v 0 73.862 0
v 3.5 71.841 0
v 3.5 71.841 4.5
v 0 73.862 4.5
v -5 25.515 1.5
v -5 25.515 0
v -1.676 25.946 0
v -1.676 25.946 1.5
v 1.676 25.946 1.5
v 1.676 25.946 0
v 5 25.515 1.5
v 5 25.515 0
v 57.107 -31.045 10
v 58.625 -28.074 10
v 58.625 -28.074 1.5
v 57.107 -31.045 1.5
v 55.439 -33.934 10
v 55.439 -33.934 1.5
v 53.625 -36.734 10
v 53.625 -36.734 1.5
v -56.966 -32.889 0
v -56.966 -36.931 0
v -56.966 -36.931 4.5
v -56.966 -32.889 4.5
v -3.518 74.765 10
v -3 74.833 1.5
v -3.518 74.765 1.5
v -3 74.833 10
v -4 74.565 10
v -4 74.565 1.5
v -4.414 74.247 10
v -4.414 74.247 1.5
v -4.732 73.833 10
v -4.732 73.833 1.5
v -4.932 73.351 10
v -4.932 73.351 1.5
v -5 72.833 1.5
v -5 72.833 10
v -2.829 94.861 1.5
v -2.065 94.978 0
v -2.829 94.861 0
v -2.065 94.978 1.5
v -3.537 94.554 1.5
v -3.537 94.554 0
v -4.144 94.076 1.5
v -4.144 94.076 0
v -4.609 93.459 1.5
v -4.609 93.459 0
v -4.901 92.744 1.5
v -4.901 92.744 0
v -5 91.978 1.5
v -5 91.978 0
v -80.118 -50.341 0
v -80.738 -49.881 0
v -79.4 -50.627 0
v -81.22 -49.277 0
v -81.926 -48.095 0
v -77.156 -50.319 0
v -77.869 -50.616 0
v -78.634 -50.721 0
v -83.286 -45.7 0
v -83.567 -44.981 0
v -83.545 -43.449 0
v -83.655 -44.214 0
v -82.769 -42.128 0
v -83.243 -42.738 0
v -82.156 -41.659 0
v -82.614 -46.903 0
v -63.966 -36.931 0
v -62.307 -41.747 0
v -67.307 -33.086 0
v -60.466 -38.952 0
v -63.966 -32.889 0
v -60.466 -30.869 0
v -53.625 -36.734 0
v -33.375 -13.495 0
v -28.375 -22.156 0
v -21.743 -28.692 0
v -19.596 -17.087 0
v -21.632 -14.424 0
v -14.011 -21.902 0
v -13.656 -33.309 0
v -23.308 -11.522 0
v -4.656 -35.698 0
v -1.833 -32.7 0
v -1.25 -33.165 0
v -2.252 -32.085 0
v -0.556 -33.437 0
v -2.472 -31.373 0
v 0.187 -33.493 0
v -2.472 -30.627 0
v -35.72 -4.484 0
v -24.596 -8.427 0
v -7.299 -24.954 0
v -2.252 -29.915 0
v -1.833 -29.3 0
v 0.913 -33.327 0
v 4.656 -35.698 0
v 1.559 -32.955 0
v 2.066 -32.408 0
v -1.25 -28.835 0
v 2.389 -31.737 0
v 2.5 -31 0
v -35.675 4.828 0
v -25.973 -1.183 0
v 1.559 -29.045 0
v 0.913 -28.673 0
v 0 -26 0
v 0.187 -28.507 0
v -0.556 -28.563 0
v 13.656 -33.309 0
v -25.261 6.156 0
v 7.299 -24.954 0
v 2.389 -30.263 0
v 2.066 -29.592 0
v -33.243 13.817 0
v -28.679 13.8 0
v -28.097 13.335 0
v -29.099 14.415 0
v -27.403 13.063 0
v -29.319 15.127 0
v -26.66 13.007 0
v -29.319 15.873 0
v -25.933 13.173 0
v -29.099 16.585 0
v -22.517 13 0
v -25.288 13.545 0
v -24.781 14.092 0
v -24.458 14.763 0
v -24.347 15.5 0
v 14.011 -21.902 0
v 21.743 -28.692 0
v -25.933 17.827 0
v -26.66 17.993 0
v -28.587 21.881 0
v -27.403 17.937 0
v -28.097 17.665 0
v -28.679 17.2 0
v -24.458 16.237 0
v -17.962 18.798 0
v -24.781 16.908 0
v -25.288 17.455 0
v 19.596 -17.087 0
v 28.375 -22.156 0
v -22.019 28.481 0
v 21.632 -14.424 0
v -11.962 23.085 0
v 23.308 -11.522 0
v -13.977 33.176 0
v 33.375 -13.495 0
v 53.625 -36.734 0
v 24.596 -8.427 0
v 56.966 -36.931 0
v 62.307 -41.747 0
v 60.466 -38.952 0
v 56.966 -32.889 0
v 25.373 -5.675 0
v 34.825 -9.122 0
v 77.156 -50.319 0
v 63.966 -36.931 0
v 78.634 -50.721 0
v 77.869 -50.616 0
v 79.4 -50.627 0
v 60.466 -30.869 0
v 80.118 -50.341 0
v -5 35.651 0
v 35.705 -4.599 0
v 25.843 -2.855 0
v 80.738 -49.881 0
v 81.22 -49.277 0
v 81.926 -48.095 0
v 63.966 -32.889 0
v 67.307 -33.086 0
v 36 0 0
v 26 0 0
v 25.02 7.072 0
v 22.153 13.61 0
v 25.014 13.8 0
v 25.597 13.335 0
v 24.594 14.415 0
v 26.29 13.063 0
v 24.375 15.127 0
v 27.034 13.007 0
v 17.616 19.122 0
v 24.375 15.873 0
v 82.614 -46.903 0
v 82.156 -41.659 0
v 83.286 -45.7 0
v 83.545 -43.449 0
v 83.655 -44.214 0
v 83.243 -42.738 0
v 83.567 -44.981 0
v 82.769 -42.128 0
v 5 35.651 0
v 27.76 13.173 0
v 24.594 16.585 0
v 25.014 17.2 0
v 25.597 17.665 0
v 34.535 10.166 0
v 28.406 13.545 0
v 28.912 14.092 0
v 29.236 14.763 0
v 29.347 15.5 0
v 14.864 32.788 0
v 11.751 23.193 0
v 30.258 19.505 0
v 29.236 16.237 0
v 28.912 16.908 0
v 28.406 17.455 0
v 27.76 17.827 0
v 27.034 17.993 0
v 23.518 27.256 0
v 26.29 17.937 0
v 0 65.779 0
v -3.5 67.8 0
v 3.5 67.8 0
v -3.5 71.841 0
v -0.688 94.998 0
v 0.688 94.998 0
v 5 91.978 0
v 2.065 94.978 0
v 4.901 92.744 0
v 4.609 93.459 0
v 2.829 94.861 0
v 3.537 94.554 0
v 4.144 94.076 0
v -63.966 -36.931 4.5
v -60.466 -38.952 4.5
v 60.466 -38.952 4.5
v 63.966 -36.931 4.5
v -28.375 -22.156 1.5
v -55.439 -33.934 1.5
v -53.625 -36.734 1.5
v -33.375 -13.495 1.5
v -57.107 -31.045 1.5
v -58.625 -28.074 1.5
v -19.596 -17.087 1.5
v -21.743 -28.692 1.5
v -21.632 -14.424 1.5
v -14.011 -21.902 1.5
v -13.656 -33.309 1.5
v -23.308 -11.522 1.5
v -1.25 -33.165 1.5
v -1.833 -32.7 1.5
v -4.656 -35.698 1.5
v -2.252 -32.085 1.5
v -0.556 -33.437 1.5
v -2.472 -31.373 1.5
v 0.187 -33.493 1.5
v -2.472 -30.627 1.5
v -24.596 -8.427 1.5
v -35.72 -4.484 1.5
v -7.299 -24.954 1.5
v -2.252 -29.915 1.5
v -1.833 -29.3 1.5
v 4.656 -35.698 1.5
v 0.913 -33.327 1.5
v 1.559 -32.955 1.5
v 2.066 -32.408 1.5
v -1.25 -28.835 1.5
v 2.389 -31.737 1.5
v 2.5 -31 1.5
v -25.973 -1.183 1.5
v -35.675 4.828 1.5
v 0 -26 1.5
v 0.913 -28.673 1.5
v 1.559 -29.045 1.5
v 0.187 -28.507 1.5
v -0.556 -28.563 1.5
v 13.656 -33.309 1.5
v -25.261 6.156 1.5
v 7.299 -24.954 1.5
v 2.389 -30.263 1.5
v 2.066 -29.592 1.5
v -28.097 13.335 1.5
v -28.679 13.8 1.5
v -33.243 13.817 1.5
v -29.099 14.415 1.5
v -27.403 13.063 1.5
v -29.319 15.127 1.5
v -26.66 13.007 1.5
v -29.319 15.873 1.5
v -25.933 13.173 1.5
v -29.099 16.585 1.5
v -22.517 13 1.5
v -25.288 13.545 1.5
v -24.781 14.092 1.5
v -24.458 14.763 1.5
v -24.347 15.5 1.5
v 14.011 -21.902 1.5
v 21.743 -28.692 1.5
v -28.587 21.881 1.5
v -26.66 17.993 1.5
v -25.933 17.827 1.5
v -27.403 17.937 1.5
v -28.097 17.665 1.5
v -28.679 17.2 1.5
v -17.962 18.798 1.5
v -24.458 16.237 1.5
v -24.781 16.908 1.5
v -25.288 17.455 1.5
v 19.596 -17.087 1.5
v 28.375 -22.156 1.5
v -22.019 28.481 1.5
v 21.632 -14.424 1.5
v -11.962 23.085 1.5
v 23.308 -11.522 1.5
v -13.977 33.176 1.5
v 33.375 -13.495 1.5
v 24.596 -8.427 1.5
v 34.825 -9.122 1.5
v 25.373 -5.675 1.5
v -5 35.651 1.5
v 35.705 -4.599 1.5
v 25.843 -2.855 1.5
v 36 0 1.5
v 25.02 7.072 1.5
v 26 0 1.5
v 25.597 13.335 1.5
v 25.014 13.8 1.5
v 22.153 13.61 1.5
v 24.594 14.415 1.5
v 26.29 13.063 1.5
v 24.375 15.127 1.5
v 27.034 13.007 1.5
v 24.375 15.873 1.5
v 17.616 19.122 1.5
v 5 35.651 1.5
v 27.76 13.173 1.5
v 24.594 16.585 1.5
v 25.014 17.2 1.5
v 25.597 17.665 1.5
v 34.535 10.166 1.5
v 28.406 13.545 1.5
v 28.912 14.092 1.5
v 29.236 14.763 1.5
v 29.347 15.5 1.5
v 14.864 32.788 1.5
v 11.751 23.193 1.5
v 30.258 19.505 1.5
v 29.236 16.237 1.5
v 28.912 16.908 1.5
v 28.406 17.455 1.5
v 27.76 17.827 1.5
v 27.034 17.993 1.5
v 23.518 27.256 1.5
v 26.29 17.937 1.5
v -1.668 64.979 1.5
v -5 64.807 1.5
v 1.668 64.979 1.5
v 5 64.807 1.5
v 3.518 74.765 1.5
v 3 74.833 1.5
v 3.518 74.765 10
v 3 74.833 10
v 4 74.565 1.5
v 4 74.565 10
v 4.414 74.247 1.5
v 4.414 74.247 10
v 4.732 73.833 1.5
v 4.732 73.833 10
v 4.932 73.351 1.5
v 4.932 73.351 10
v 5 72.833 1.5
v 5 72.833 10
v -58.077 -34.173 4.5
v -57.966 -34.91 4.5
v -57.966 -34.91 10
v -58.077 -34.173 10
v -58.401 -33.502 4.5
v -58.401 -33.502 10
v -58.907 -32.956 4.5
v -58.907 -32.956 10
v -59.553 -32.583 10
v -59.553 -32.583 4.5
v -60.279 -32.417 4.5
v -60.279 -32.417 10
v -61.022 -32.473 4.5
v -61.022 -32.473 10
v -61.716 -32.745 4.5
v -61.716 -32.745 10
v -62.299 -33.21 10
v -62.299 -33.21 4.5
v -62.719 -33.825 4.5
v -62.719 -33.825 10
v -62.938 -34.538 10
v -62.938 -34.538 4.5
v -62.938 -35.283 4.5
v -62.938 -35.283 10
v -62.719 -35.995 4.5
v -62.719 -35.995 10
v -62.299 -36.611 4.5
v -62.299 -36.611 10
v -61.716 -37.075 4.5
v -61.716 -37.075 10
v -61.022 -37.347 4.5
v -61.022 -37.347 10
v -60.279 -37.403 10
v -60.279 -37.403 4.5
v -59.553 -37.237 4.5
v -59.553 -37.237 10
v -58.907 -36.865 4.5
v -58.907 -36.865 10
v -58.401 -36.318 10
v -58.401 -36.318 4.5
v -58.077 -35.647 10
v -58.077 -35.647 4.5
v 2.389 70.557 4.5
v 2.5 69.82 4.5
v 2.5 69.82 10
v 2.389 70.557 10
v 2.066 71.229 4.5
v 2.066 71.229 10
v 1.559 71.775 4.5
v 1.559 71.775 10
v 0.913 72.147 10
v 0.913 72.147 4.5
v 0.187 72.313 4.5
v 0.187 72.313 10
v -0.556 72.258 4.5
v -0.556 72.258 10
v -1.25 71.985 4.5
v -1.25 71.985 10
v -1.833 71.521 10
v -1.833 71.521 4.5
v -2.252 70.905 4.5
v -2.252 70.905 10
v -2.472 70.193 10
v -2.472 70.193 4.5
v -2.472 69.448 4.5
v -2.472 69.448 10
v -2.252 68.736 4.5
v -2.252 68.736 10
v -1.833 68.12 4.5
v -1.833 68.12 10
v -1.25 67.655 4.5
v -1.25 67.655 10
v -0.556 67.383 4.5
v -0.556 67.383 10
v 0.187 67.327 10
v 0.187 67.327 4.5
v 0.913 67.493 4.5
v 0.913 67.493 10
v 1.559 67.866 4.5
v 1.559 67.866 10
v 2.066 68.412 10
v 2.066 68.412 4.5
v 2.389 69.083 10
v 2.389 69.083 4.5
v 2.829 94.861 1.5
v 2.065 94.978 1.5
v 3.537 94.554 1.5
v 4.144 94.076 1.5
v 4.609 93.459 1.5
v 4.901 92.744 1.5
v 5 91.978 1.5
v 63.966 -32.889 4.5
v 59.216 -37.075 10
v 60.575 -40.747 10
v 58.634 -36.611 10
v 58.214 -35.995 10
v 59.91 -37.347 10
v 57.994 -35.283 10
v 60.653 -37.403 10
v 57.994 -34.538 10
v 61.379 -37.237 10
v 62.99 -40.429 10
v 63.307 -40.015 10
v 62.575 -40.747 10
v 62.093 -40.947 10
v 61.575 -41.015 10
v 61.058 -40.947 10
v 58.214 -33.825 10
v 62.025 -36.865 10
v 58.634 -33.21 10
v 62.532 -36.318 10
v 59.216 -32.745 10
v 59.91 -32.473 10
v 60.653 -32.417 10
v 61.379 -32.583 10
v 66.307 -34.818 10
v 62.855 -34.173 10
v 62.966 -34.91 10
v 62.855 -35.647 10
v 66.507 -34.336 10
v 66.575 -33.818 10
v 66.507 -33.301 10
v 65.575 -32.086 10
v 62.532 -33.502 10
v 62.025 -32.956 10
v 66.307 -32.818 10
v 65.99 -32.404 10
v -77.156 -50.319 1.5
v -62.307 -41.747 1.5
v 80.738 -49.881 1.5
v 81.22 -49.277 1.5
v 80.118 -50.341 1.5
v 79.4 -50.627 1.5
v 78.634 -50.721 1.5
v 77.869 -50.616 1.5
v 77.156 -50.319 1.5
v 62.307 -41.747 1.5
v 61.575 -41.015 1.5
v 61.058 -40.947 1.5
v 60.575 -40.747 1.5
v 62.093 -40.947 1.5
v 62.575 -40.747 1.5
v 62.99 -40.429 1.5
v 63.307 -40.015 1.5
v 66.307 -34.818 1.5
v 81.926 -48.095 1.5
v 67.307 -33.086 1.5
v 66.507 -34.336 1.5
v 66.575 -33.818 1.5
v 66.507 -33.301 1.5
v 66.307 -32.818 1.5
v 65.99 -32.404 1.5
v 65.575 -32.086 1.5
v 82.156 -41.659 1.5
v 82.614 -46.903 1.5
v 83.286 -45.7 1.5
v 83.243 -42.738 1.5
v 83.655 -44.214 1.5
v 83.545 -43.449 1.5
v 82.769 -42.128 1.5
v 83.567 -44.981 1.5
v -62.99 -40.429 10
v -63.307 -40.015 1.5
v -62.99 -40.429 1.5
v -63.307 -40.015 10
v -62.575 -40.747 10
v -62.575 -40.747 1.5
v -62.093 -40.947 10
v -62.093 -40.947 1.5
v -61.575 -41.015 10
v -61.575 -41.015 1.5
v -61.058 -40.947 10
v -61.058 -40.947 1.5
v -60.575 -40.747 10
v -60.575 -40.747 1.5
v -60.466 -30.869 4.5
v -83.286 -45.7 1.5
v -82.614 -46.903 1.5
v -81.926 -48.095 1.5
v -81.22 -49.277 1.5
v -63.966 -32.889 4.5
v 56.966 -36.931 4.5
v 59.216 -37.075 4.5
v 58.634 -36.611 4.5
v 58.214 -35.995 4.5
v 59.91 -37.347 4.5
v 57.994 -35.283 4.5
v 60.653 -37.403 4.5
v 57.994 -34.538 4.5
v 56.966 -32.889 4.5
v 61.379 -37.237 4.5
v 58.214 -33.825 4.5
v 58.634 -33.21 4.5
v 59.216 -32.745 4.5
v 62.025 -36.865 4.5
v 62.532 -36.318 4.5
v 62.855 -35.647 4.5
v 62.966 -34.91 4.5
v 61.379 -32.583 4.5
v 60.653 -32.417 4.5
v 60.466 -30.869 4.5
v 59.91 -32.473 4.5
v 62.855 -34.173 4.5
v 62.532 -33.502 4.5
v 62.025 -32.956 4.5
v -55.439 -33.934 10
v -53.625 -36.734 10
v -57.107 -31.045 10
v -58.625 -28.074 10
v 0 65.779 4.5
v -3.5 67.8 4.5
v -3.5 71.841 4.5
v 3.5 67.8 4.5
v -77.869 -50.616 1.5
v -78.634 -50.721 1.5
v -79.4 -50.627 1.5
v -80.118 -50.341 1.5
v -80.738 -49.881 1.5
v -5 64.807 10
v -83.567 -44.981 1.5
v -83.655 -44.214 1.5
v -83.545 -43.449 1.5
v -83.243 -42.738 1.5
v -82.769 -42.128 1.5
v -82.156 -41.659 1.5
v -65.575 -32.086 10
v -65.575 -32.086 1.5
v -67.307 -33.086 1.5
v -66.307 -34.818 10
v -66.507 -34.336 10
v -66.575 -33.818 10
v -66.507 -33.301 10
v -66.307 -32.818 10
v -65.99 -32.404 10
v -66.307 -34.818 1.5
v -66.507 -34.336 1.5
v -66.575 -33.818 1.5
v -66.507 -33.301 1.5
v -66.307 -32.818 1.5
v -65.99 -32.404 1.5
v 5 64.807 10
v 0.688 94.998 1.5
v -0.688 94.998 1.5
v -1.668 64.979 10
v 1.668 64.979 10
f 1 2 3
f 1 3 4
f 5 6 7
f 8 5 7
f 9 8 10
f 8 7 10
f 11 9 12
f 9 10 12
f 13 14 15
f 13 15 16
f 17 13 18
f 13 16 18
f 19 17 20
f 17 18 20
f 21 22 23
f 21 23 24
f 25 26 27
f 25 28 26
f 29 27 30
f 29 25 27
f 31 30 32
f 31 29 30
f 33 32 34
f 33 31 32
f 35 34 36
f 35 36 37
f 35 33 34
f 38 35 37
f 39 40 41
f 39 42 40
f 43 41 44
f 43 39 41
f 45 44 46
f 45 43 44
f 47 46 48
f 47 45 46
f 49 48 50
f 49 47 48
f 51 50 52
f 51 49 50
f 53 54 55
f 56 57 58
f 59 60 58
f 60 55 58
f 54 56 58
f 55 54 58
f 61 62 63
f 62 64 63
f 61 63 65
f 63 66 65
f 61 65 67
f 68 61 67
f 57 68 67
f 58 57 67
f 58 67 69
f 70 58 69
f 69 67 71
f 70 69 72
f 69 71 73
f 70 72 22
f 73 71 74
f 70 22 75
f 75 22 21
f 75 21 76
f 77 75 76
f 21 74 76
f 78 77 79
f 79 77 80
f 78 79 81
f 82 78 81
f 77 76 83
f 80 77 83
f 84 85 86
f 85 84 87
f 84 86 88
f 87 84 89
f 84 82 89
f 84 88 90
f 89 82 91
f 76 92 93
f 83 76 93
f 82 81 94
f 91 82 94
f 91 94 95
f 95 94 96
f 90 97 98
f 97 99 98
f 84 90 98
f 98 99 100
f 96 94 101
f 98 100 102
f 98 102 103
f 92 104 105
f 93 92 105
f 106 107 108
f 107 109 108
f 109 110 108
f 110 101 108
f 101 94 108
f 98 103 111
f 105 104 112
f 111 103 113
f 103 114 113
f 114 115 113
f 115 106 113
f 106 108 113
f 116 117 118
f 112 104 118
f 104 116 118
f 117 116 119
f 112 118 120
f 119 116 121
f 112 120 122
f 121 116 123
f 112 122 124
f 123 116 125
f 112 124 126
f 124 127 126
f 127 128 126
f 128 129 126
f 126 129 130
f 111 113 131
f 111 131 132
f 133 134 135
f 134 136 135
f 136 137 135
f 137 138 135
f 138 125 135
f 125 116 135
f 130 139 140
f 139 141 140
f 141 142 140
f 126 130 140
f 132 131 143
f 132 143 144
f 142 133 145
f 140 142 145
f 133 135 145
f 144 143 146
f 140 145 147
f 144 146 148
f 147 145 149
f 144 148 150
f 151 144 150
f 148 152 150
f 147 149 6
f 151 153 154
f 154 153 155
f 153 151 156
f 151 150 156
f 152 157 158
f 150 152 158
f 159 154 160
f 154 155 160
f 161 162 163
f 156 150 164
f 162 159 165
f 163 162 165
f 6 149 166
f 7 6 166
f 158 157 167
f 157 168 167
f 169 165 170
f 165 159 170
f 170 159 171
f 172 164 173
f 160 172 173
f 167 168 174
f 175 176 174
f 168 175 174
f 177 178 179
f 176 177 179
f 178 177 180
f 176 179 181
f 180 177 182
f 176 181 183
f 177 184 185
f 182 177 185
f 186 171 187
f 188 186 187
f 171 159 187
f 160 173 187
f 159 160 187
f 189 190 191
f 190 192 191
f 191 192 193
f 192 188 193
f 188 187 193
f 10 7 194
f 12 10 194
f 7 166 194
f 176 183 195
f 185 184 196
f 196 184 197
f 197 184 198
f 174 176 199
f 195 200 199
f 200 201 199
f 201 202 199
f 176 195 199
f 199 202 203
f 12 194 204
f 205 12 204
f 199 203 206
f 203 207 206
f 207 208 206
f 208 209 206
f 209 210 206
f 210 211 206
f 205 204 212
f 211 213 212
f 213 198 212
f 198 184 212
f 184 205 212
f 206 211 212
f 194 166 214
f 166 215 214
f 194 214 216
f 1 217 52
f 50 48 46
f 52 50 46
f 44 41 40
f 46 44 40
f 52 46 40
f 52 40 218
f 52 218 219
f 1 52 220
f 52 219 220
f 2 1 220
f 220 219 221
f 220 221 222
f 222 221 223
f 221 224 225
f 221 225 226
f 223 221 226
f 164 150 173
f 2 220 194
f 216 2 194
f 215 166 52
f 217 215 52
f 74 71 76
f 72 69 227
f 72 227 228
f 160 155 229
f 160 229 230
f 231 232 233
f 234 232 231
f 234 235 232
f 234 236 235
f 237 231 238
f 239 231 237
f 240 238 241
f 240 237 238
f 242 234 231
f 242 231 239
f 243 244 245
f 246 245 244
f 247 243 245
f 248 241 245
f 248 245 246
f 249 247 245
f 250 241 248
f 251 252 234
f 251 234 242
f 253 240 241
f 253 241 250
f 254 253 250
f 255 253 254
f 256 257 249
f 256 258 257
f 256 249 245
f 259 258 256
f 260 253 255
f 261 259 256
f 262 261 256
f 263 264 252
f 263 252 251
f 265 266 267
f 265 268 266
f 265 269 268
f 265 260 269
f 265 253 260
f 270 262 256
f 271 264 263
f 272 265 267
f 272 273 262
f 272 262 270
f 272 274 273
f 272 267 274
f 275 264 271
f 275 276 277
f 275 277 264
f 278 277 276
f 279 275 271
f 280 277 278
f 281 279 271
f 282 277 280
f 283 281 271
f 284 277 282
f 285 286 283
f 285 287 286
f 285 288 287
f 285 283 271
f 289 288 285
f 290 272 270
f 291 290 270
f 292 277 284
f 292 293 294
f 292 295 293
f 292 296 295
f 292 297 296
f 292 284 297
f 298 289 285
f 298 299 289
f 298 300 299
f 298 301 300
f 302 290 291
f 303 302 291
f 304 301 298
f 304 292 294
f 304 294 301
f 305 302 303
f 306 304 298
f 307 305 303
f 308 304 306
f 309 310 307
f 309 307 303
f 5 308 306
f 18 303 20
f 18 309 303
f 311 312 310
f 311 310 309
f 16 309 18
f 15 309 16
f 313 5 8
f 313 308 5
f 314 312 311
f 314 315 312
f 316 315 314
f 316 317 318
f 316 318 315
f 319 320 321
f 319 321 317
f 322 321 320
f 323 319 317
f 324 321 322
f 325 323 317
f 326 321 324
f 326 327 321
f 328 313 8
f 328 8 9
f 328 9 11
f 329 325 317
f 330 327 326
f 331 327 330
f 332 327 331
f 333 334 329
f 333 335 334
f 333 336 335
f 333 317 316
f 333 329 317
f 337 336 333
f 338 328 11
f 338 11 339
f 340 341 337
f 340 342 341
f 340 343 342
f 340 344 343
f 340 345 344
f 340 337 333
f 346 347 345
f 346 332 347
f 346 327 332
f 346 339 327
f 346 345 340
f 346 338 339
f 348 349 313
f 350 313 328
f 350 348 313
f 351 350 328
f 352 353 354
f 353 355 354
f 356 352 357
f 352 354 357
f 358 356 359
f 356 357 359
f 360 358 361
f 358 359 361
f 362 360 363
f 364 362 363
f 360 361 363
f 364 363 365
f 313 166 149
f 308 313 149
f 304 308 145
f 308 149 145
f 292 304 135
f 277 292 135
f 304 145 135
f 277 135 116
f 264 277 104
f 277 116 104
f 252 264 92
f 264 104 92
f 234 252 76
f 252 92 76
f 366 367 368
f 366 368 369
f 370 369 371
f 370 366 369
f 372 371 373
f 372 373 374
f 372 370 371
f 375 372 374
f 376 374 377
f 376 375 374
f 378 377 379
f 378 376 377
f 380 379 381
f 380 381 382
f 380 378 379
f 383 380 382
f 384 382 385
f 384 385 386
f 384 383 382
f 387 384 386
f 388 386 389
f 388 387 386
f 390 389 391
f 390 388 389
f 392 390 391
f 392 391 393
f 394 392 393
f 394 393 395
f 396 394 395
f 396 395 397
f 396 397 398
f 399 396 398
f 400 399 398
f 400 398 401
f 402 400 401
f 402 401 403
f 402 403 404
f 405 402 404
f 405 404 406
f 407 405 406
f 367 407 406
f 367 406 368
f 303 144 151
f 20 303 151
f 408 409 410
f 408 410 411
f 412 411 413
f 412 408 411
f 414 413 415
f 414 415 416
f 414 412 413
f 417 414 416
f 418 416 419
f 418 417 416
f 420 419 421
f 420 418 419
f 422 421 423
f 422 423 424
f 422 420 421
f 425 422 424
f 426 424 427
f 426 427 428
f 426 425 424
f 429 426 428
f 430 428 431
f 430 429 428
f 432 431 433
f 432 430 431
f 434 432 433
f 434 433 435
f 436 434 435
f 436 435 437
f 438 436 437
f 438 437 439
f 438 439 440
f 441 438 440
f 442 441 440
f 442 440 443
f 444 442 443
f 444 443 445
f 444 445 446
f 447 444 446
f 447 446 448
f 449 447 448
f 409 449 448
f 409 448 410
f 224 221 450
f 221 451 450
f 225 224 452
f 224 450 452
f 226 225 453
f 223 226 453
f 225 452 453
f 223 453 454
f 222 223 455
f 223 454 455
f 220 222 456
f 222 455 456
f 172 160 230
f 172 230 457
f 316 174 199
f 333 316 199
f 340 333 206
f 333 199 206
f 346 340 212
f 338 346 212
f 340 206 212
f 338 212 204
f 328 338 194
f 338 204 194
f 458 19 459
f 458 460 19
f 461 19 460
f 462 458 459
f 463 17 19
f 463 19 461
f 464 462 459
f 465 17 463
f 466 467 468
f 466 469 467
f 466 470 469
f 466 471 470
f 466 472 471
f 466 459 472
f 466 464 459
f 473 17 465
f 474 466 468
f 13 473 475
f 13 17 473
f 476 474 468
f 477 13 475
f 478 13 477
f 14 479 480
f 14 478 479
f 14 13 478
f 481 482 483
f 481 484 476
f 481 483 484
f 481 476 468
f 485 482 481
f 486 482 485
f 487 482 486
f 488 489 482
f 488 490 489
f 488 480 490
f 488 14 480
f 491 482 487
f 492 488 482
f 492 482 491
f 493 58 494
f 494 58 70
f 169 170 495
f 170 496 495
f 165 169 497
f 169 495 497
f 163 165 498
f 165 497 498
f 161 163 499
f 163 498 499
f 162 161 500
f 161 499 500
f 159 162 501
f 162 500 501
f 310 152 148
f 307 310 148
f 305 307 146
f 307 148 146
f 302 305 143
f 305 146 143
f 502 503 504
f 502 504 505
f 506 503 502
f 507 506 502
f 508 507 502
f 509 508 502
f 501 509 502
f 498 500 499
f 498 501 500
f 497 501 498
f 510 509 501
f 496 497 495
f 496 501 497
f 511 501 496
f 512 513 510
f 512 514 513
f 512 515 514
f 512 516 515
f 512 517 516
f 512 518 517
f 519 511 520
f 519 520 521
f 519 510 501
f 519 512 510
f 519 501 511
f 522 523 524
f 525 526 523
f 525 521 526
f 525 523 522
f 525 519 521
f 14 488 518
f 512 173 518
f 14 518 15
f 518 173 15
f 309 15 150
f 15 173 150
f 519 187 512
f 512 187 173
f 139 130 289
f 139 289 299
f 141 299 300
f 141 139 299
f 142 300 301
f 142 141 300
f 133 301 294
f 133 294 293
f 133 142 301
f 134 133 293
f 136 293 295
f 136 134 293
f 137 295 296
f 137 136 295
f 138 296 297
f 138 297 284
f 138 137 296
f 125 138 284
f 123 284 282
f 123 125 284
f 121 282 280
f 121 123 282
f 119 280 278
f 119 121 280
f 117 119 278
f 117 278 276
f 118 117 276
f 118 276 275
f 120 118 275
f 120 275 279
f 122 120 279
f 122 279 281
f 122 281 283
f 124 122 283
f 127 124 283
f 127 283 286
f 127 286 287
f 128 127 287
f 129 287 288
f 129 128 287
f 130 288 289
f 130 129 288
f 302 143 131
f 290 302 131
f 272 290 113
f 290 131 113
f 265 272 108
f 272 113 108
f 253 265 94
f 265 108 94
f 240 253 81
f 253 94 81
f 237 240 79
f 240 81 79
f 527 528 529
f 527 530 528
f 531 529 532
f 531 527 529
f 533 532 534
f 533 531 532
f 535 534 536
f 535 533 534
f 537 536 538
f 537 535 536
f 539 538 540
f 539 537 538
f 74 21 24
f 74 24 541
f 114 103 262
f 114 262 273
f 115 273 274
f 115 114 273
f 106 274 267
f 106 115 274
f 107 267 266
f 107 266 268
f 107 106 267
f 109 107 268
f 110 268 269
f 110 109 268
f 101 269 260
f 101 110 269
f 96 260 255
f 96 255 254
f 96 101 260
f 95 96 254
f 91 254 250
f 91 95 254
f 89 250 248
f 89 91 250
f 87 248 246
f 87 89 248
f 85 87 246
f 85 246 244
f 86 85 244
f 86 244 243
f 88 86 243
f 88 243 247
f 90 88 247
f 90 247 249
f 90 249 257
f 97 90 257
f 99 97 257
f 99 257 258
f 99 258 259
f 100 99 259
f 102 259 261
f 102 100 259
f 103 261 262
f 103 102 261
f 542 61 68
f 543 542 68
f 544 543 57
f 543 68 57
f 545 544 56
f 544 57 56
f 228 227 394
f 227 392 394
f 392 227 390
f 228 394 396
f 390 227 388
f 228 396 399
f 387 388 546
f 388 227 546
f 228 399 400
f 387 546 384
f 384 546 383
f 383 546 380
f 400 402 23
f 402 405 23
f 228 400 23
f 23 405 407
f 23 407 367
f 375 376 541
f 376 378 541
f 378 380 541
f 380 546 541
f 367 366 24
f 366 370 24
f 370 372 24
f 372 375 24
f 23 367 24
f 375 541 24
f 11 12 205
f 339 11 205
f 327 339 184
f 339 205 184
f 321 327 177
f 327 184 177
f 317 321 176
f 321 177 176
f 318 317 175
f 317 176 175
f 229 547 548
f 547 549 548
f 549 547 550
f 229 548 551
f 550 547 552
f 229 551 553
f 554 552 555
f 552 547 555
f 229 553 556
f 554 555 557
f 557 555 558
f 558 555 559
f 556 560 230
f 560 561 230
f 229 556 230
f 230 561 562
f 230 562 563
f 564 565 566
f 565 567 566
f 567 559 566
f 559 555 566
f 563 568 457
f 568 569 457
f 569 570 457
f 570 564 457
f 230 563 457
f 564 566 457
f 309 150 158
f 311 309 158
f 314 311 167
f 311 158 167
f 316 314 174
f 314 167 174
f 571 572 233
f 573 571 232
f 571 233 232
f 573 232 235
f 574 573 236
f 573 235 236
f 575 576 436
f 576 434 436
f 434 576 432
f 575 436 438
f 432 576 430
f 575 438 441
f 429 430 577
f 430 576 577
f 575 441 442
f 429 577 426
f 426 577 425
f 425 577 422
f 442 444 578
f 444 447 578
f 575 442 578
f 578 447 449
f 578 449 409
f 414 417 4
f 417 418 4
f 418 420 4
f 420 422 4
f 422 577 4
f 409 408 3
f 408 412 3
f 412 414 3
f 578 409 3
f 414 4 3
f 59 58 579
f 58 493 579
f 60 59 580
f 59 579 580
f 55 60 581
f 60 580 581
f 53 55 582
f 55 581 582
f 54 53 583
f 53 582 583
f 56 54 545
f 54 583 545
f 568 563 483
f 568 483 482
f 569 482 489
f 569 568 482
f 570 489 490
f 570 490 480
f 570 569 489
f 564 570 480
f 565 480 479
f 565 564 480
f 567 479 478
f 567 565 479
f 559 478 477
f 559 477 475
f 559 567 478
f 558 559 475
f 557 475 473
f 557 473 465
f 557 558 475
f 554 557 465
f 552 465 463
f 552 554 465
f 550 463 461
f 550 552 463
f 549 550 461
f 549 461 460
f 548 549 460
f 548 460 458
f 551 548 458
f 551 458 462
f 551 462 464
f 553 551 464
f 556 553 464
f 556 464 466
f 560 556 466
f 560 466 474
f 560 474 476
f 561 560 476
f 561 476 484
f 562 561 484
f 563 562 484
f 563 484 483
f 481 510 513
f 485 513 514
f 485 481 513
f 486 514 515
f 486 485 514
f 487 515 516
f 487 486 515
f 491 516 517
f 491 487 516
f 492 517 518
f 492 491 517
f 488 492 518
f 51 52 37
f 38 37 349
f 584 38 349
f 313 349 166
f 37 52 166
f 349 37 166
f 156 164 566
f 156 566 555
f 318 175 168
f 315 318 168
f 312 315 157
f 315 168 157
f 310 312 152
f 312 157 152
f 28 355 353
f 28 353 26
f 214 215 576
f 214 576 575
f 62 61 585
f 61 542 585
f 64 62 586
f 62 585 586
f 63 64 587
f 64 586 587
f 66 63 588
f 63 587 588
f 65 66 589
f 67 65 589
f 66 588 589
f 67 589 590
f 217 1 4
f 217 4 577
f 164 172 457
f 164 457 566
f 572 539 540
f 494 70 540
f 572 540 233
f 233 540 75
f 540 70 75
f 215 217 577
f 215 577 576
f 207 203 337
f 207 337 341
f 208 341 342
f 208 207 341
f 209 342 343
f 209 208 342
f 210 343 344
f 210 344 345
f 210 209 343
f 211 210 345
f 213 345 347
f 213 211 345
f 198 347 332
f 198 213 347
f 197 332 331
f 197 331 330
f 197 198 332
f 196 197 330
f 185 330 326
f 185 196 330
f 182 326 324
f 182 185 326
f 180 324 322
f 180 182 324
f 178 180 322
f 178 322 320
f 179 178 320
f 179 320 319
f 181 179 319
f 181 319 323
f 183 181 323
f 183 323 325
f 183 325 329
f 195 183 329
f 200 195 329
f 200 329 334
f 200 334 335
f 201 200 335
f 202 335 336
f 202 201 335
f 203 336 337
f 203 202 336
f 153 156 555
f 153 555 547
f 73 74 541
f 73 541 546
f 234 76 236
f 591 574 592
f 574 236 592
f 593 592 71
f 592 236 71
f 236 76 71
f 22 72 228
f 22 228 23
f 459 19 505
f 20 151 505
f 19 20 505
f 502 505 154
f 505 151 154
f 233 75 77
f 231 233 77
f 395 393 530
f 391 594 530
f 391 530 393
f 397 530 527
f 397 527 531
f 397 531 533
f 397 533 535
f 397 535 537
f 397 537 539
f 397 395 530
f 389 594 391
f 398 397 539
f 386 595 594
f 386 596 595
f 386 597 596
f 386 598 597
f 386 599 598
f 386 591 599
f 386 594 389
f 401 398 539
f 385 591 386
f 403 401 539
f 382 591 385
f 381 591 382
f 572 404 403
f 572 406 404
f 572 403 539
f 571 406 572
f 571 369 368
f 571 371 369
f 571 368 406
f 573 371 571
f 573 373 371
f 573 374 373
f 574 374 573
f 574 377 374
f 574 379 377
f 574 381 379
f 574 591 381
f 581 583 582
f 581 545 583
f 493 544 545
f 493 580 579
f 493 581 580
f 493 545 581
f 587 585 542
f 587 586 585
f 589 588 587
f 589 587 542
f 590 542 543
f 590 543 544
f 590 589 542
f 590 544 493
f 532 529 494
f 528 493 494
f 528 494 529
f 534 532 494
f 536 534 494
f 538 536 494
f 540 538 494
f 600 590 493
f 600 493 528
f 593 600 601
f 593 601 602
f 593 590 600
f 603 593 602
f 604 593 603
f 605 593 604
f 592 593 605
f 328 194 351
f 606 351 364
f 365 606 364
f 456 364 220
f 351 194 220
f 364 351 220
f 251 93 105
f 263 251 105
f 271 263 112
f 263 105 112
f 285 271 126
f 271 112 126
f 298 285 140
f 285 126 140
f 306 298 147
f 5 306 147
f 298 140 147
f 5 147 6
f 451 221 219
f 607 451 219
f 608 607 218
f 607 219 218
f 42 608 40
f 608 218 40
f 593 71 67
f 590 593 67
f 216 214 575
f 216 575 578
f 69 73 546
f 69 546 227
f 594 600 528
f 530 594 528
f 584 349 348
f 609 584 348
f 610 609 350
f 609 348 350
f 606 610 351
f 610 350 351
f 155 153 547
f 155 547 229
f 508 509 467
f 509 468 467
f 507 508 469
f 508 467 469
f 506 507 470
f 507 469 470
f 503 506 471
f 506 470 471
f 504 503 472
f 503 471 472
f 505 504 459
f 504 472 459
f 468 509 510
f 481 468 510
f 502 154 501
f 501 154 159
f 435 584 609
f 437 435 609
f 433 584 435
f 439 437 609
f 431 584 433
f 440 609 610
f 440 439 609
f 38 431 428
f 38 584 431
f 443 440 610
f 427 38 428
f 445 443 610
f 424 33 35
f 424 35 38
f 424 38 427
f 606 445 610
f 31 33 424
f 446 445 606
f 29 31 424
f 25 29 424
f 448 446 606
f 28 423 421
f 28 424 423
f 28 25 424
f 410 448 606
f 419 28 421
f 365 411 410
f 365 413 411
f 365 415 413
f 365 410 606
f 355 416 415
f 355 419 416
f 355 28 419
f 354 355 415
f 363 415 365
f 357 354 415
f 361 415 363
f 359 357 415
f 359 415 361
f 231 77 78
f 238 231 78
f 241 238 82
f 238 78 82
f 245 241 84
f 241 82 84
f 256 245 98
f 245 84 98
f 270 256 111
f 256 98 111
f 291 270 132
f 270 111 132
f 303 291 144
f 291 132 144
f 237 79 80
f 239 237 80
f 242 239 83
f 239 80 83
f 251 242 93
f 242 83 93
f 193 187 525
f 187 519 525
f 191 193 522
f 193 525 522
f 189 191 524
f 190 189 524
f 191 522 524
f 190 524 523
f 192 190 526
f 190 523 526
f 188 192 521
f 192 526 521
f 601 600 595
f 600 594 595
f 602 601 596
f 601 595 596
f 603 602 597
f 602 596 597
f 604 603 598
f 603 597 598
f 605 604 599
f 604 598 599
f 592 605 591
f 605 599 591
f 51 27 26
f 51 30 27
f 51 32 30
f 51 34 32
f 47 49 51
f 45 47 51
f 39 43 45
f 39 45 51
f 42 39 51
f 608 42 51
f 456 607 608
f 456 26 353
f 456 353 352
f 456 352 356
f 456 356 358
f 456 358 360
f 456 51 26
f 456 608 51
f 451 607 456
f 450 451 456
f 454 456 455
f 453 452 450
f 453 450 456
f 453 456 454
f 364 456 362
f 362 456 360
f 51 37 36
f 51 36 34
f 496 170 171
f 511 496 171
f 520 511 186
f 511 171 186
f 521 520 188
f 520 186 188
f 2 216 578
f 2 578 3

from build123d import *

# Parameters (mm, degrees)
F0_R     = 2.5
F1_DEPTH = 1.5
F2_DEPTH = 10
F3_R     = 2
F4_R     = 3
F5_DEPTH = 4.5


with BuildPart() as f1:
    # F0 (on Top) → F1 (new body)
    with BuildSketch(Plane.XY):
        with BuildLine():
            Line((84.6583836258, -43.1040378836), (67.3074069841, -33.0864468488))
            ThreePointArc((67.3074069841, -33.0864468488), (64.9519052838, -37.5), (62.3074069841, -41.7467008867))
            Line((62.3074069841, -41.7467008867), (79.6583836258, -51.7642919214))
            ThreePointArc((79.6583836258, -51.7642919214), (82.2724133595, -47.5), (84.6583836258, -43.1040378836))
        make_face()
        with BuildLine():
            ThreePointArc((62.3074069841, -41.7467008867), (64.9519052838, -37.5), (67.3074069841, -33.0864468488))
            Line((67.3074069841, -33.0864468488), (62.3074069841, -41.7467008867))
        make_face()
        with BuildLine():
            Line((67.3074069841, -33.0864468488), (58.6248608016, -28.0735764731))
            ThreePointArc((58.6248608016, -28.0735764731), (56.291651246, -32.5), (53.6248608016, -36.733830511))
            Line((53.6248608016, -36.733830511), (62.3074069841, -41.7467008867))
            Line((62.3074069841, -41.7467008867), (67.3074069841, -33.0864468488))
        make_face()
        Polygon((63.9661338928, -36.9308646221), (60.4661338928, -38.9515905642), (56.9661338928, -36.9308646221), (56.9661338928, -32.8894127377), (60.4661338928, -30.8686867956), (63.9661338928, -32.8894127377), align=None, mode=Mode.SUBTRACT)
        with BuildLine():
            Line((58.6248608016, -28.0735764731), (33.3747469625, -13.4954164511))
            ThreePointArc((33.3747469625, -13.4954164511), (31.1769145362, -18), (28.3747469625, -22.1556704889))
            Line((28.3747469625, -22.1556704889), (53.6248608016, -36.733830511))
            ThreePointArc((53.6248608016, -36.733830511), (56.291651246, -32.5), (58.6248608016, -28.0735764731))
        make_face()
        with BuildLine():
            Line((33.3747469625, -13.4954164511), (24.596379794, -8.4272238033))
            ThreePointArc((24.596379794, -8.4272238033), (22.5166604984, -13), (19.596379794, -17.0874778411))
            Line((19.596379794, -17.0874778411), (28.3747469625, -22.1556704889))
            ThreePointArc((28.3747469625, -22.1556704889), (31.1769145362, -18), (33.3747469625, -13.4954164511))
        make_face()
        with BuildLine():
            ThreePointArc((5, 25.5147016443), (20.0748598999, 16.5227116419), (26, 0))
            ThreePointArc((26, 0), (25.6466944716, -4.2716580713), (24.596379794, -8.4272238033))
            Line((24.596379794, -8.4272238033), (33.3747469625, -13.4954164511))
            ThreePointArc((33.3747469625, -13.4954164511), (35.3375925231, -6.8741948383), (36, 0))
            ThreePointArc((36, 0), (27.1661554144, 23.622023622), (5, 35.65108694))
            Line((5, 35.65108694), (5, 25.5147016443))
        make_face()
        with Locations((26.8467875173, 15.5)):
            Circle(F0_R, mode=Mode.SUBTRACT)
        with BuildLine():
            Line((28.3747469625, -22.1556704889), (19.596379794, -17.0874778411))
            ThreePointArc((19.596379794, -17.0874778411), (0, -26), (-19.596379794, -17.0874778411))
            Line((-19.596379794, -17.0874778411), (-28.3747469625, -22.1556704889))
            ThreePointArc((-28.3747469625, -22.1556704889), (0, -36), (28.3747469625, -22.1556704889))
        make_face()
        with Locations((0, -31)):
            Circle(F0_R, mode=Mode.SUBTRACT)
        with BuildLine():
            ThreePointArc((-28.3747469625, -22.1556704889), (-31.1769145362, -18), (-33.3747469625, -13.4954164511))
            Line((-33.3747469625, -13.4954164511), (-58.6248608016, -28.0735764731))
            ThreePointArc((-58.6248608016, -28.0735764731), (-56.291651246, -32.5), (-53.6248608016, -36.733830511))
            Line((-53.6248608016, -36.733830511), (-28.3747469625, -22.1556704889))
        make_face()
        with BuildLine():
            ThreePointArc((-19.596379794, -17.0874778411), (-22.5166604984, -13), (-24.596379794, -8.4272238033))
            Line((-24.596379794, -8.4272238033), (-33.3747469625, -13.4954164511))
            ThreePointArc((-33.3747469625, -13.4954164511), (-31.1769145362, -18), (-28.3747469625, -22.1556704889))
            Line((-28.3747469625, -22.1556704889), (-19.596379794, -17.0874778411))
        make_face()
        with BuildLine():
            ThreePointArc((-53.6248608016, -36.733830511), (-56.291651246, -32.5), (-58.6248608016, -28.0735764731))
            Line((-58.6248608016, -28.0735764731), (-67.3074069841, -33.0864468488))
            Line((-67.3074069841, -33.0864468488), (-62.3074069841, -41.7467008867))
            Line((-62.3074069841, -41.7467008867), (-53.6248608016, -36.733830511))
        make_face()
        Polygon((-63.9661338928, -32.8894127377), (-60.4661338928, -30.8686867956), (-56.9661338928, -32.8894127377), (-56.9661338928, -36.9308646221), (-60.4661338928, -38.9515905642), (-63.9661338928, -36.9308646221), align=None, mode=Mode.SUBTRACT)
        with BuildLine():
            Line((-62.3074069841, -41.7467008867), (-67.3074069841, -33.0864468488))
            ThreePointArc((-67.3074069841, -33.0864468488), (-64.9519052838, -37.5), (-62.3074069841, -41.7467008867))
        make_face()
        with BuildLine():
            ThreePointArc((-62.3074069841, -41.7467008867), (-64.9519052838, -37.5), (-67.3074069841, -33.0864468488))
            Line((-67.3074069841, -33.0864468488), (-84.6583836258, -43.1040378836))
            ThreePointArc((-84.6583836258, -43.1040378836), (-82.2724133595, -47.5), (-79.6583836258, -51.7642919214))
            Line((-79.6583836258, -51.7642919214), (-62.3074069841, -41.7467008867))
        make_face()
        with BuildLine():
            ThreePointArc((-24.596379794, -8.4272238033), (-22.5166604984, 13), (-5, 25.5147016443))
            Line((-5, 25.5147016443), (-5, 35.65108694))
            ThreePointArc((-5, 35.65108694), (-31.1769145362, 18), (-33.3747469625, -13.4954164511))
            Line((-33.3747469625, -13.4954164511), (-24.596379794, -8.4272238033))
        make_face()
        with Locations((-26.8467875173, 15.5)):
            Circle(F0_R, mode=Mode.SUBTRACT)
        with BuildLine():
            ThreePointArc((-5, 25.5147016443), (0, 26), (5, 25.5147016443))
            Line((5, 25.5147016443), (5, 35.65108694))
            ThreePointArc((5, 35.65108694), (0, 36), (-5, 35.65108694))
            Line((-5, 35.65108694), (-5, 25.5147016443))
        make_face()
        with BuildLine():
            ThreePointArc((-5, 35.65108694), (0, 36), (5, 35.65108694))
            Line((5, 35.65108694), (5, 64.8074069841))
            ThreePointArc((5, 64.8074069841), (0, 65), (-5, 64.8074069841))
            Line((-5, 64.8074069841), (-5, 35.65108694))
        make_face()
        with BuildLine():
            ThreePointArc((-5, 64.8074069841), (0, 65), (5, 64.8074069841))
            Line((5, 64.8074069841), (5, 74.8331477355))
            Line((5, 74.8331477355), (-5, 74.8331477355))
            Line((-5, 74.8331477355), (-5, 64.8074069841))
        make_face()
        Polygon((0, 73.8617292441), (3.5, 71.8410033019), (3.5, 67.7995514176), (0, 65.7788254755), (-3.5, 67.7995514176), (-3.5, 71.8410033019), align=None, mode=Mode.SUBTRACT)
        with BuildLine():
            Line((-5, 74.8331477355), (5, 74.8331477355))
            ThreePointArc((5, 74.8331477355), (0, 75), (-5, 74.8331477355))
        make_face()
        with BuildLine():
            ThreePointArc((-5, 74.8331477355), (0, 75), (5, 74.8331477355))
            Line((5, 74.8331477355), (5, 94.8683298051))
            ThreePointArc((5, 94.8683298051), (0, 95), (-5, 94.8683298051))
            Line((-5, 94.8683298051), (-5, 74.8331477355))
        make_face()
        Polygon((56.9661338928, -36.9308646221), (60.4661338928, -38.9515905642), (63.9661338928, -36.9308646221), (63.9661338928, -32.8894127377), (60.4661338928, -30.8686867956), (56.9661338928, -32.8894127377), align=None)
        with Locations((60.4661338928, -34.9101386799)):
            Circle(F0_R, mode=Mode.SUBTRACT)
        Polygon((3.5, 67.7995514176), (3.5, 71.8410033019), (0, 73.8617292441), (-3.5, 71.8410033019), (-3.5, 67.7995514176), (0, 65.7788254755), align=None)
        with Locations((0, 69.8202773598)):
            Circle(F0_R, mode=Mode.SUBTRACT)
        Polygon((-56.9661338928, -32.8894127377), (-60.4661338928, -30.8686867956), (-63.9661338928, -32.8894127377), (-63.9661338928, -36.9308646221), (-60.4661338928, -38.9515905642), (-56.9661338928, -36.9308646221), align=None)
        with Locations((-60.4661338928, -34.9101386799)):
            Circle(F0_R, mode=Mode.SUBTRACT)
    extrude(amount=F1_DEPTH)

    # F0 (on Top) → F2 (join)
    with BuildSketch(Plane.XY):
        with BuildLine():
            ThreePointArc((-53.6248608016, -36.733830511), (-56.291651246, -32.5), (-58.6248608016, -28.0735764731))
            Line((-58.6248608016, -28.0735764731), (-67.3074069841, -33.0864468488))
            Line((-67.3074069841, -33.0864468488), (-62.3074069841, -41.7467008867))
            Line((-62.3074069841, -41.7467008867), (-53.6248608016, -36.733830511))
        make_face()
        Polygon((-63.9661338928, -32.8894127377), (-60.4661338928, -30.8686867956), (-56.9661338928, -32.8894127377), (-56.9661338928, -36.9308646221), (-60.4661338928, -38.9515905642), (-63.9661338928, -36.9308646221), align=None, mode=Mode.SUBTRACT)
        with BuildLine():
            ThreePointArc((-5, 64.8074069841), (0, 65), (5, 64.8074069841))
            Line((5, 64.8074069841), (5, 74.8331477355))
            Line((5, 74.8331477355), (-5, 74.8331477355))
            Line((-5, 74.8331477355), (-5, 64.8074069841))
        make_face()
        Polygon((0, 73.8617292441), (3.5, 71.8410033019), (3.5, 67.7995514176), (0, 65.7788254755), (-3.5, 67.7995514176), (-3.5, 71.8410033019), align=None, mode=Mode.SUBTRACT)
        with BuildLine():
            Line((67.3074069841, -33.0864468488), (58.6248608016, -28.0735764731))
            ThreePointArc((58.6248608016, -28.0735764731), (56.291651246, -32.5), (53.6248608016, -36.733830511))
            Line((53.6248608016, -36.733830511), (62.3074069841, -41.7467008867))
            Line((62.3074069841, -41.7467008867), (67.3074069841, -33.0864468488))
        make_face()
        Polygon((63.9661338928, -36.9308646221), (60.4661338928, -38.9515905642), (56.9661338928, -36.9308646221), (56.9661338928, -32.8894127377), (60.4661338928, -30.8686867956), (63.9661338928, -32.8894127377), align=None, mode=Mode.SUBTRACT)
        Polygon((-56.9661338928, -32.8894127377), (-60.4661338928, -30.8686867956), (-63.9661338928, -32.8894127377), (-63.9661338928, -36.9308646221), (-60.4661338928, -38.9515905642), (-56.9661338928, -36.9308646221), align=None)
        with Locations((-60.4661338928, -34.9101386799)):
            Circle(F0_R, mode=Mode.SUBTRACT)
        Polygon((56.9661338928, -36.9308646221), (60.4661338928, -38.9515905642), (63.9661338928, -36.9308646221), (63.9661338928, -32.8894127377), (60.4661338928, -30.8686867956), (56.9661338928, -32.8894127377), align=None)
        with Locations((60.4661338928, -34.9101386799)):
            Circle(F0_R, mode=Mode.SUBTRACT)
        Polygon((3.5, 67.7995514176), (3.5, 71.8410033019), (0, 73.8617292441), (-3.5, 71.8410033019), (-3.5, 67.7995514176), (0, 65.7788254755), align=None)
        with Locations((0, 69.8202773598)):
            Circle(F0_R, mode=Mode.SUBTRACT)
    extrude(amount=F2_DEPTH)

    # F3
    f3_edges = [f1.edges().sort_by_distance(p)[0] for p in [
        (67.307407, -33.086447, 5.75),
        (62.307407, -41.746701, 5.75),
        (-62.307407, -41.746701, 5.75),
        (-67.307407, -33.086447, 5.75),
        (5, 74.833148, 5.75),
        (-5, 74.833148, 5.75),
    ]]
    fillet(f3_edges, radius=F3_R)

    # F4
    f4_edges = [f1.edges().sort_by_distance(p)[0] for p in [
        (84.658384, -43.104038, 0.75),
        (79.658384, -51.764292, 0.75),
        (-79.658384, -51.764292, 0.75),
        (-84.658384, -43.104038, 0.75),
        (-5, 94.86833, 0.75),
        (5, 94.86833, 0.75),
    ]]
    fillet(f4_edges, radius=F4_R)

    # F0 (on Top) → F5 (cut)
    with BuildSketch(Plane.XY):
        Polygon((56.9661338928, -36.9308646221), (60.4661338928, -38.9515905642), (63.9661338928, -36.9308646221), (63.9661338928, -32.8894127377), (60.4661338928, -30.8686867956), (56.9661338928, -32.8894127377), align=None)
        with Locations((60.4661338928, -34.9101386799)):
            Circle(F0_R, mode=Mode.SUBTRACT)
        Polygon((-56.9661338928, -32.8894127377), (-60.4661338928, -30.8686867956), (-63.9661338928, -32.8894127377), (-63.9661338928, -36.9308646221), (-60.4661338928, -38.9515905642), (-56.9661338928, -36.9308646221), align=None)
        with Locations((-60.4661338928, -34.9101386799)):
            Circle(F0_R, mode=Mode.SUBTRACT)
        Polygon((3.5, 67.7995514176), (3.5, 71.8410033019), (0, 73.8617292441), (-3.5, 71.8410033019), (-3.5, 67.7995514176), (0, 65.7788254755), align=None)
        with Locations((0, 69.8202773598)):
            Circle(F0_R, mode=Mode.SUBTRACT)
    extrude(amount=F5_DEPTH, mode=Mode.SUBTRACT)


solid = f1.part
